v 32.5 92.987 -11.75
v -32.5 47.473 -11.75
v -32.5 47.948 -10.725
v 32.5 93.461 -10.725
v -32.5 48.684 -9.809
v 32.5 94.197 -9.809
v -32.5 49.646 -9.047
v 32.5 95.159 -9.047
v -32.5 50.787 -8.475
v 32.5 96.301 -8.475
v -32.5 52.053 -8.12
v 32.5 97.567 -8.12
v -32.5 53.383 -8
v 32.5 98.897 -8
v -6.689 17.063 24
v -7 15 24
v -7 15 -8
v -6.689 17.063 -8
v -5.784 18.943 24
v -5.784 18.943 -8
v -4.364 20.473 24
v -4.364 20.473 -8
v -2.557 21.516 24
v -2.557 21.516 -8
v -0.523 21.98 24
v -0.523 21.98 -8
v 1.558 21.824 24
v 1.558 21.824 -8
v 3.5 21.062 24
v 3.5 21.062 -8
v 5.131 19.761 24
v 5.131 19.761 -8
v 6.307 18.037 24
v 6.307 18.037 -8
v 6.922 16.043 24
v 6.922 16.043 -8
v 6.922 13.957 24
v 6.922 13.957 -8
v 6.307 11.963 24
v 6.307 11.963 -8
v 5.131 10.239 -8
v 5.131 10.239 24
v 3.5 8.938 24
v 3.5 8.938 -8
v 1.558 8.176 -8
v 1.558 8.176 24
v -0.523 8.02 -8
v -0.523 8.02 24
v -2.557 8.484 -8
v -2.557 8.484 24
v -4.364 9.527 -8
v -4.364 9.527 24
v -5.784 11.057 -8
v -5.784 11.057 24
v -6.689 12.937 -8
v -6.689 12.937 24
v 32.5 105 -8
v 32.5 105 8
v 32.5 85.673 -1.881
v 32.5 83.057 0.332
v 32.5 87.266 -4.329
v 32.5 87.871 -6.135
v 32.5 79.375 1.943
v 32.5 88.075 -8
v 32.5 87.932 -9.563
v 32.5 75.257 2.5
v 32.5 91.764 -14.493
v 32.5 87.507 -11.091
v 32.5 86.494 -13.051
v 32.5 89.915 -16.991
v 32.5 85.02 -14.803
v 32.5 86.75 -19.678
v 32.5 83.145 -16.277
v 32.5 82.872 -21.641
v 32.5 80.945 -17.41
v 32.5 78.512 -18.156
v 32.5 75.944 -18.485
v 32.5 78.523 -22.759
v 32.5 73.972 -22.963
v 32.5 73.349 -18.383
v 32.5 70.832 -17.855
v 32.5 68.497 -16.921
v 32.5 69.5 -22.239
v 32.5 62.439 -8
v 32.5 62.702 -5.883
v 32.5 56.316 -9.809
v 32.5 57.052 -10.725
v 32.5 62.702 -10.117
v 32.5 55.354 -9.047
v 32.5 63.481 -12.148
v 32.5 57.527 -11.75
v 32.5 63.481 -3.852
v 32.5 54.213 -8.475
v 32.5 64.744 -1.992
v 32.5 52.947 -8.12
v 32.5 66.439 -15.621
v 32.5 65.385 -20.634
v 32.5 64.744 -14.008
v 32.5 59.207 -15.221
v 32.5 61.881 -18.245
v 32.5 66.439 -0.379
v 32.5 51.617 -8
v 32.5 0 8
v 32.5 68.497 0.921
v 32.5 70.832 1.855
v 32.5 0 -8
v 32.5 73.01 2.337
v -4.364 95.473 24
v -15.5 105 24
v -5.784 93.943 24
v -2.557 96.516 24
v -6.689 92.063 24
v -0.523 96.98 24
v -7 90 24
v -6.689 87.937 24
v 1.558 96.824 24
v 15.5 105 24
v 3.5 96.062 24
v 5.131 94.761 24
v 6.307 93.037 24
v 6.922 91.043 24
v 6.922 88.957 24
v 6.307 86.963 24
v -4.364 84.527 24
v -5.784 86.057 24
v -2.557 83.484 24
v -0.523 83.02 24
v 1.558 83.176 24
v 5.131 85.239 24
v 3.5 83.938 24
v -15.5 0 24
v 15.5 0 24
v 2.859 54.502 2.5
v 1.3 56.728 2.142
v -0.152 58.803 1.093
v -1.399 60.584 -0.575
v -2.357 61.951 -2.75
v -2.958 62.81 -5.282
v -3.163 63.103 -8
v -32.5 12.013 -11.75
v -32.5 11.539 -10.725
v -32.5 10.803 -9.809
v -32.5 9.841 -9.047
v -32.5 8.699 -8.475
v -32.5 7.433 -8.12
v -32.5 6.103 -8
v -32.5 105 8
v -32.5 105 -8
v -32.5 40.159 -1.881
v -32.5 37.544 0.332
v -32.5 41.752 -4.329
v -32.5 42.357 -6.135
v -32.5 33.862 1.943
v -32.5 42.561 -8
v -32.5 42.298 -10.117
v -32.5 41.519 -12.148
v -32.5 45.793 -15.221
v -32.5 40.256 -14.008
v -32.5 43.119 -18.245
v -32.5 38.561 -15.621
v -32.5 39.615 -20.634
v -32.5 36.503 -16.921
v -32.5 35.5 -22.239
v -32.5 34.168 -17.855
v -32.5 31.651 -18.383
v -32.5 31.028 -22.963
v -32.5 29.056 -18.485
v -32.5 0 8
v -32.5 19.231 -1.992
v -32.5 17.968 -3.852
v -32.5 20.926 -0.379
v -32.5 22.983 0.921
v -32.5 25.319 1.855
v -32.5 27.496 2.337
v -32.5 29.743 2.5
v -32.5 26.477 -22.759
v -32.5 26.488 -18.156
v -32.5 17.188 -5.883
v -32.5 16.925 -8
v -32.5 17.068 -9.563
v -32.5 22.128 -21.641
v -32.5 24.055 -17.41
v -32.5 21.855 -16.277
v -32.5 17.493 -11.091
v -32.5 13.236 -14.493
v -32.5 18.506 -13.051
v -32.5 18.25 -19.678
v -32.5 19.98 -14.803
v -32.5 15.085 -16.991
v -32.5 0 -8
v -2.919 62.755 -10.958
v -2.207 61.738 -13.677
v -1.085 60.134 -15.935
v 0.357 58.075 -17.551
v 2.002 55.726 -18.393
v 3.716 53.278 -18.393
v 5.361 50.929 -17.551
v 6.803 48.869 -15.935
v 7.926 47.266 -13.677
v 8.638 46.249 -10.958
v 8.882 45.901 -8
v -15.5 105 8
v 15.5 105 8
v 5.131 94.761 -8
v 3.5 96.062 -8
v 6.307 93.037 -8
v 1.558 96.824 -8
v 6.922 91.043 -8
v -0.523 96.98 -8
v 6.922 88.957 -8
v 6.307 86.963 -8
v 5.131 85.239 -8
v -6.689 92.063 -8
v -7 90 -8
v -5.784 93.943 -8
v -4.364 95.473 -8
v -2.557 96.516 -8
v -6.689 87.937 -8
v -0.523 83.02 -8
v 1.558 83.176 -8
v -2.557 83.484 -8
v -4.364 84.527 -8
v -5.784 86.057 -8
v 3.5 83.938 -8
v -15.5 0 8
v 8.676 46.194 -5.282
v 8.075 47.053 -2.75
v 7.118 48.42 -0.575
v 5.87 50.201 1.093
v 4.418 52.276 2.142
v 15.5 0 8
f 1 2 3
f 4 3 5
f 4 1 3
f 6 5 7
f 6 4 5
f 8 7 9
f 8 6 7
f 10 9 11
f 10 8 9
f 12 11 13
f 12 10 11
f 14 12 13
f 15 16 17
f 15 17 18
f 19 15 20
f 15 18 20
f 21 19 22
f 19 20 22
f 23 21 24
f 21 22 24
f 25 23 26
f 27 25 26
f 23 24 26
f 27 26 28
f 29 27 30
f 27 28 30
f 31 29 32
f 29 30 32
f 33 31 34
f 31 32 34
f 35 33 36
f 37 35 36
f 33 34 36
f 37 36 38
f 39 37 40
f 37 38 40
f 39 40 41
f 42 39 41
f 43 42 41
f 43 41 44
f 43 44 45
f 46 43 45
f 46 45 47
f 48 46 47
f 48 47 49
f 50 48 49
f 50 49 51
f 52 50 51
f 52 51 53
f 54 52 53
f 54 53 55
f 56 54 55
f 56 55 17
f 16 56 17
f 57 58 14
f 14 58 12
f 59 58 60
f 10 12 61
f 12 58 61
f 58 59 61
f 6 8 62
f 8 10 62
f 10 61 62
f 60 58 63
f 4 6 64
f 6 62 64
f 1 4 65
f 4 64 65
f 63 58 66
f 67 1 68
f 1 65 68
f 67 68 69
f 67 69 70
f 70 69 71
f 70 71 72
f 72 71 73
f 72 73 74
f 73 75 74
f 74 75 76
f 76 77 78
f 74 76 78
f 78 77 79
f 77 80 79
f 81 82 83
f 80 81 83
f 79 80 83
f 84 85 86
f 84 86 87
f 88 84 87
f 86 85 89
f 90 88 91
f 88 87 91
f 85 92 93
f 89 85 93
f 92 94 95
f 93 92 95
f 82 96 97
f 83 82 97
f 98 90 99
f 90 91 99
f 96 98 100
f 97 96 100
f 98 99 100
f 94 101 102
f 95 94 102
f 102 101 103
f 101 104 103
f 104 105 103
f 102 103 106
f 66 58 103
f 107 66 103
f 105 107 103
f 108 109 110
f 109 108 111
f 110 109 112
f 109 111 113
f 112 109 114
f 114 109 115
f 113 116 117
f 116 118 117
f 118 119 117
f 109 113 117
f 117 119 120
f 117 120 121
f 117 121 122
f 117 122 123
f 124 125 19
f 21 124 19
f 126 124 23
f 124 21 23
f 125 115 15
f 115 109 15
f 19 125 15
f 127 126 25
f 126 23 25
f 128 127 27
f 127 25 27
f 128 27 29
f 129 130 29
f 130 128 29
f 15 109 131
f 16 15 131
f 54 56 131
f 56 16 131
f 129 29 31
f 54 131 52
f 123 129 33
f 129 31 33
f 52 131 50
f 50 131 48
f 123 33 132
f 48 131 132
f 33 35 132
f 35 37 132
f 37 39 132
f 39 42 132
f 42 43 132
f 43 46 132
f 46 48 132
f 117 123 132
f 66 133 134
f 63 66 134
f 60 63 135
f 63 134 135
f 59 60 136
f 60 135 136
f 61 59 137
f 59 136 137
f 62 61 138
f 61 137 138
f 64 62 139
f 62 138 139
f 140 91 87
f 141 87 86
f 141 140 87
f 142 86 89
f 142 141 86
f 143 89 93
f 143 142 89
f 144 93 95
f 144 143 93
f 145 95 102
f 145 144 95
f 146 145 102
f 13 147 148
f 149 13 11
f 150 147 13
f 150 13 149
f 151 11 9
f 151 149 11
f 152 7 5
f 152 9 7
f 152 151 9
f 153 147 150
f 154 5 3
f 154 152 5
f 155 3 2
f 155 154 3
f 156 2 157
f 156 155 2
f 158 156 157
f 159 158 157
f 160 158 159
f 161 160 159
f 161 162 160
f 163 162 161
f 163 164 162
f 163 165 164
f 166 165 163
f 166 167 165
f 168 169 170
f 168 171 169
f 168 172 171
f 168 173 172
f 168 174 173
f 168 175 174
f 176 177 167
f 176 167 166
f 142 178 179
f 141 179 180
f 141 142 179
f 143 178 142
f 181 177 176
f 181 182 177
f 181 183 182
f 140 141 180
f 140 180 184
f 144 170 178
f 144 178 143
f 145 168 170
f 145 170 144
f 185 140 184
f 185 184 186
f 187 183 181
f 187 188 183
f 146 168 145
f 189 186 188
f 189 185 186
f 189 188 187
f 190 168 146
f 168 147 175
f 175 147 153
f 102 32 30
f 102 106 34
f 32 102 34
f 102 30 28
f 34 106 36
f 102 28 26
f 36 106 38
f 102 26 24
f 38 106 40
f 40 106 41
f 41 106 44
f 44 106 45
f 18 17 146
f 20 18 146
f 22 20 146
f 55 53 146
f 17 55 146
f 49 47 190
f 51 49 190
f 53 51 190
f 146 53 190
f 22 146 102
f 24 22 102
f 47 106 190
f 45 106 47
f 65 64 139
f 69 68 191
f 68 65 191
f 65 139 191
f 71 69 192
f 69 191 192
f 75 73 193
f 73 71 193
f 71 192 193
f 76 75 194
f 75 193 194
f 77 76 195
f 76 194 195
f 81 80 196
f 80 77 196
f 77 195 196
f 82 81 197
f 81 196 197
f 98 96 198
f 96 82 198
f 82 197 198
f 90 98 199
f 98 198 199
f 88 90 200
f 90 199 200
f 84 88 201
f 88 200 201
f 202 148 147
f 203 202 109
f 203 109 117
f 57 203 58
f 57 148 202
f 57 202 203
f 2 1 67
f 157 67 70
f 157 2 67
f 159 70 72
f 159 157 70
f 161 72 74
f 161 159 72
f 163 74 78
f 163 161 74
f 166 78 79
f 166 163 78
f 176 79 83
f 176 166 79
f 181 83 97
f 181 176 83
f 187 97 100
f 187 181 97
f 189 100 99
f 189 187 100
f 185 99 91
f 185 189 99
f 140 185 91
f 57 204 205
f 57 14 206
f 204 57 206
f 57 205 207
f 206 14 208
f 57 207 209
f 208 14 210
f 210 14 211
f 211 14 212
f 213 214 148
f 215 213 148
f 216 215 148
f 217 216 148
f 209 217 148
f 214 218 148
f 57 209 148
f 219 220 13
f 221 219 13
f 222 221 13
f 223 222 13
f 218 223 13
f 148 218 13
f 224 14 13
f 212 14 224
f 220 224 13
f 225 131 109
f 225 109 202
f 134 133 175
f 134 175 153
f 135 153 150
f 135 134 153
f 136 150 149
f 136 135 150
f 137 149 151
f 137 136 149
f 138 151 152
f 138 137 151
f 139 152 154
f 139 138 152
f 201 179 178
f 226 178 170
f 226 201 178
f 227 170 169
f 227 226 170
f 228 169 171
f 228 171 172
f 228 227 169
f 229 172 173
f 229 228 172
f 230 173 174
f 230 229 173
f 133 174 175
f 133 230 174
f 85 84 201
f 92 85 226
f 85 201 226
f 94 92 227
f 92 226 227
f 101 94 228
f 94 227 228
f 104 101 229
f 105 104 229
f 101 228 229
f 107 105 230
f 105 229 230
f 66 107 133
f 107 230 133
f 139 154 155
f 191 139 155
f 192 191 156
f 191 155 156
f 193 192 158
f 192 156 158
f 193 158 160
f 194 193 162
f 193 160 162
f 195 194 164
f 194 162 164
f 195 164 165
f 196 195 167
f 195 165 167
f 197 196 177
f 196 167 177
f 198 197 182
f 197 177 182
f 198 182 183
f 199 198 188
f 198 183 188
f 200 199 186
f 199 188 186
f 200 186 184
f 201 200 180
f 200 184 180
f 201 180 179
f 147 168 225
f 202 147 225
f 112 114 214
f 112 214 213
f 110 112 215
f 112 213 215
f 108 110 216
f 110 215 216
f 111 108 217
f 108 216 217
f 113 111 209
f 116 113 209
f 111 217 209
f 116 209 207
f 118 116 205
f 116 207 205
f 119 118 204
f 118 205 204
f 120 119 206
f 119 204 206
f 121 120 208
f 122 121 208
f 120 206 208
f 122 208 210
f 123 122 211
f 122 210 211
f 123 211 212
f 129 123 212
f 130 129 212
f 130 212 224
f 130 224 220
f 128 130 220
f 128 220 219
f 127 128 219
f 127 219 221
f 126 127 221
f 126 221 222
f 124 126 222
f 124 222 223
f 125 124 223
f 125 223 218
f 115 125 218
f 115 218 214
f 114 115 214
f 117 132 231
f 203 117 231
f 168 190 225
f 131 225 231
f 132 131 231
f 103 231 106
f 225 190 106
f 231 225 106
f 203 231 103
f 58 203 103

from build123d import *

# Parameters (mm, degrees)
SKETCH1_W                       = 65
SKETCH1_H                       = 16
SKETCH1_W_2                     = 31
SKETCH1_H_2                     = 32
BOSS_EXTRUDE1_DEPTH             = 105
SKETCH2_R                       = 7
CUT_EXTRUDE1_DEPTH              = 105
BOSS_EXTRUDE2_REACH             = 62.226
SKETCH8_R                       = 15
SKETCH8_R_2                     = 10.5
BOSS_EXTRUDE2_DIRECTION_2_REACH = 55.245
SKETCH8_2_R                     = 10.5
CUT_EXTRUDE2_DEPTH              = 61.225525817
CUT_EXTRUDE2_DEPTH_BACK         = 54.244882879
FILLET2_R                       = 5


with BuildPart() as part:
    # Sketch1 → Boss-Extrude1 (new body)
    with BuildSketch(Plane(origin=(0, 0, 0), x_dir=(1, 0, 0), z_dir=(0, 1, 0))):
        Rectangle(SKETCH1_W, SKETCH1_H)
        with Locations((0, -8)):
            Rectangle(SKETCH1_W_2, SKETCH1_H_2)
    extrude(amount=BOSS_EXTRUDE1_DEPTH)

    # Sketch2 → Cut-Extrude1 (cut)
    with BuildSketch(Plane(origin=(0, 0, -8), x_dir=(-1, 0, 0), z_dir=(0, 0, -1))):
        with Locations((0, 90)):
            Circle(SKETCH2_R)
        with Locations((0, 15)):
            Circle(SKETCH2_R)
    extrude(amount=-CUT_EXTRUDE1_DEPTH, mode=Mode.SUBTRACT)

    # Boss-Extrude2: up to this face of the body (flat: up to its plane)
    boss_extrude2_end = Plane(part.part.faces().sort_by_distance((-32.5, 52.5, 0))[0])
    # Sketch8 → Boss-Extrude2 (add, up to the picked face)
    with BuildSketch(Plane(origin=(27.526035262, 19.273937388, 0), x_dir=(0, 0, 1), z_dir=(-0.819152044, -0.573576436, 0)), mode=Mode.PRIVATE) as boss_extrude2_sk1:
        with Locations((-8, 43.005482325)):
            Circle(SKETCH8_R)
        with Locations((-8, 43.005482325)):
            Circle(SKETCH8_R_2, mode=Mode.SUBTRACT)
    boss_extrude2_tool1 = split(extrude(boss_extrude2_sk1.sketch, amount=BOSS_EXTRUDE2_REACH, mode=Mode.PRIVATE), bisect_by=boss_extrude2_end, keep=Keep.BOTH, mode=Mode.PRIVATE)
    add(boss_extrude2_tool1.solids().sort_by_distance((2.859104, 54.501966, -22.575736))[0])

    # Boss-Extrude2 direction 2: up to this face of the body (flat: up to its plane)
    boss_extrude2_direction_2_end = Plane(part.part.faces().sort_by_distance((32.5, 52.5, 0))[0])
    # Sketch8 → Boss-Extrude2 direction 2 (add, up to the picked face)
    with BuildSketch(Plane(origin=(27.526035262, 19.273937388, 0), x_dir=(0, 0, 1), z_dir=(-0.819152044, -0.573576436, 0)), mode=Mode.PRIVATE) as boss_extrude2_direction_2_sk1:
        with Locations((-8, 43.005482325)):
            Circle(SKETCH8_R)
        with Locations((-8, 43.005482325)):
            Circle(SKETCH8_R_2, mode=Mode.SUBTRACT)
    boss_extrude2_direction_2_tool1 = split(extrude(boss_extrude2_direction_2_sk1.sketch, amount=-BOSS_EXTRUDE2_DIRECTION_2_REACH, mode=Mode.PRIVATE), bisect_by=boss_extrude2_direction_2_end, keep=Keep.BOTH, mode=Mode.PRIVATE)
    add(boss_extrude2_direction_2_tool1.solids().sort_by_distance((2.859104, 54.501966, -22.575736))[0])

    # Sketch8<2> → Cut-Extrude2 (cut, two sides)
    with BuildSketch(Plane(origin=(27.526035262, 19.273937388, 0), x_dir=(0, 0, 1), z_dir=(-0.819152044, -0.573576436, 0))) as cut_extrude2_sk:
        with Locations((-8, 43.005482325)):
            Circle(SKETCH8_2_R)
    extrude(amount=CUT_EXTRUDE2_DEPTH, mode=Mode.SUBTRACT)
    extrude(cut_extrude2_sk.sketch, amount=-CUT_EXTRUDE2_DEPTH_BACK, mode=Mode.SUBTRACT)

    # Fillet2
    fillet2_edges = [part.edges().sort_by_distance(p)[0] for p in [
        (0, 70.811618831, -8),
        (0, 34.188381169, -8),
    ]]
    fillet(fillet2_edges, radius=FILLET2_R)


solid = part.part
